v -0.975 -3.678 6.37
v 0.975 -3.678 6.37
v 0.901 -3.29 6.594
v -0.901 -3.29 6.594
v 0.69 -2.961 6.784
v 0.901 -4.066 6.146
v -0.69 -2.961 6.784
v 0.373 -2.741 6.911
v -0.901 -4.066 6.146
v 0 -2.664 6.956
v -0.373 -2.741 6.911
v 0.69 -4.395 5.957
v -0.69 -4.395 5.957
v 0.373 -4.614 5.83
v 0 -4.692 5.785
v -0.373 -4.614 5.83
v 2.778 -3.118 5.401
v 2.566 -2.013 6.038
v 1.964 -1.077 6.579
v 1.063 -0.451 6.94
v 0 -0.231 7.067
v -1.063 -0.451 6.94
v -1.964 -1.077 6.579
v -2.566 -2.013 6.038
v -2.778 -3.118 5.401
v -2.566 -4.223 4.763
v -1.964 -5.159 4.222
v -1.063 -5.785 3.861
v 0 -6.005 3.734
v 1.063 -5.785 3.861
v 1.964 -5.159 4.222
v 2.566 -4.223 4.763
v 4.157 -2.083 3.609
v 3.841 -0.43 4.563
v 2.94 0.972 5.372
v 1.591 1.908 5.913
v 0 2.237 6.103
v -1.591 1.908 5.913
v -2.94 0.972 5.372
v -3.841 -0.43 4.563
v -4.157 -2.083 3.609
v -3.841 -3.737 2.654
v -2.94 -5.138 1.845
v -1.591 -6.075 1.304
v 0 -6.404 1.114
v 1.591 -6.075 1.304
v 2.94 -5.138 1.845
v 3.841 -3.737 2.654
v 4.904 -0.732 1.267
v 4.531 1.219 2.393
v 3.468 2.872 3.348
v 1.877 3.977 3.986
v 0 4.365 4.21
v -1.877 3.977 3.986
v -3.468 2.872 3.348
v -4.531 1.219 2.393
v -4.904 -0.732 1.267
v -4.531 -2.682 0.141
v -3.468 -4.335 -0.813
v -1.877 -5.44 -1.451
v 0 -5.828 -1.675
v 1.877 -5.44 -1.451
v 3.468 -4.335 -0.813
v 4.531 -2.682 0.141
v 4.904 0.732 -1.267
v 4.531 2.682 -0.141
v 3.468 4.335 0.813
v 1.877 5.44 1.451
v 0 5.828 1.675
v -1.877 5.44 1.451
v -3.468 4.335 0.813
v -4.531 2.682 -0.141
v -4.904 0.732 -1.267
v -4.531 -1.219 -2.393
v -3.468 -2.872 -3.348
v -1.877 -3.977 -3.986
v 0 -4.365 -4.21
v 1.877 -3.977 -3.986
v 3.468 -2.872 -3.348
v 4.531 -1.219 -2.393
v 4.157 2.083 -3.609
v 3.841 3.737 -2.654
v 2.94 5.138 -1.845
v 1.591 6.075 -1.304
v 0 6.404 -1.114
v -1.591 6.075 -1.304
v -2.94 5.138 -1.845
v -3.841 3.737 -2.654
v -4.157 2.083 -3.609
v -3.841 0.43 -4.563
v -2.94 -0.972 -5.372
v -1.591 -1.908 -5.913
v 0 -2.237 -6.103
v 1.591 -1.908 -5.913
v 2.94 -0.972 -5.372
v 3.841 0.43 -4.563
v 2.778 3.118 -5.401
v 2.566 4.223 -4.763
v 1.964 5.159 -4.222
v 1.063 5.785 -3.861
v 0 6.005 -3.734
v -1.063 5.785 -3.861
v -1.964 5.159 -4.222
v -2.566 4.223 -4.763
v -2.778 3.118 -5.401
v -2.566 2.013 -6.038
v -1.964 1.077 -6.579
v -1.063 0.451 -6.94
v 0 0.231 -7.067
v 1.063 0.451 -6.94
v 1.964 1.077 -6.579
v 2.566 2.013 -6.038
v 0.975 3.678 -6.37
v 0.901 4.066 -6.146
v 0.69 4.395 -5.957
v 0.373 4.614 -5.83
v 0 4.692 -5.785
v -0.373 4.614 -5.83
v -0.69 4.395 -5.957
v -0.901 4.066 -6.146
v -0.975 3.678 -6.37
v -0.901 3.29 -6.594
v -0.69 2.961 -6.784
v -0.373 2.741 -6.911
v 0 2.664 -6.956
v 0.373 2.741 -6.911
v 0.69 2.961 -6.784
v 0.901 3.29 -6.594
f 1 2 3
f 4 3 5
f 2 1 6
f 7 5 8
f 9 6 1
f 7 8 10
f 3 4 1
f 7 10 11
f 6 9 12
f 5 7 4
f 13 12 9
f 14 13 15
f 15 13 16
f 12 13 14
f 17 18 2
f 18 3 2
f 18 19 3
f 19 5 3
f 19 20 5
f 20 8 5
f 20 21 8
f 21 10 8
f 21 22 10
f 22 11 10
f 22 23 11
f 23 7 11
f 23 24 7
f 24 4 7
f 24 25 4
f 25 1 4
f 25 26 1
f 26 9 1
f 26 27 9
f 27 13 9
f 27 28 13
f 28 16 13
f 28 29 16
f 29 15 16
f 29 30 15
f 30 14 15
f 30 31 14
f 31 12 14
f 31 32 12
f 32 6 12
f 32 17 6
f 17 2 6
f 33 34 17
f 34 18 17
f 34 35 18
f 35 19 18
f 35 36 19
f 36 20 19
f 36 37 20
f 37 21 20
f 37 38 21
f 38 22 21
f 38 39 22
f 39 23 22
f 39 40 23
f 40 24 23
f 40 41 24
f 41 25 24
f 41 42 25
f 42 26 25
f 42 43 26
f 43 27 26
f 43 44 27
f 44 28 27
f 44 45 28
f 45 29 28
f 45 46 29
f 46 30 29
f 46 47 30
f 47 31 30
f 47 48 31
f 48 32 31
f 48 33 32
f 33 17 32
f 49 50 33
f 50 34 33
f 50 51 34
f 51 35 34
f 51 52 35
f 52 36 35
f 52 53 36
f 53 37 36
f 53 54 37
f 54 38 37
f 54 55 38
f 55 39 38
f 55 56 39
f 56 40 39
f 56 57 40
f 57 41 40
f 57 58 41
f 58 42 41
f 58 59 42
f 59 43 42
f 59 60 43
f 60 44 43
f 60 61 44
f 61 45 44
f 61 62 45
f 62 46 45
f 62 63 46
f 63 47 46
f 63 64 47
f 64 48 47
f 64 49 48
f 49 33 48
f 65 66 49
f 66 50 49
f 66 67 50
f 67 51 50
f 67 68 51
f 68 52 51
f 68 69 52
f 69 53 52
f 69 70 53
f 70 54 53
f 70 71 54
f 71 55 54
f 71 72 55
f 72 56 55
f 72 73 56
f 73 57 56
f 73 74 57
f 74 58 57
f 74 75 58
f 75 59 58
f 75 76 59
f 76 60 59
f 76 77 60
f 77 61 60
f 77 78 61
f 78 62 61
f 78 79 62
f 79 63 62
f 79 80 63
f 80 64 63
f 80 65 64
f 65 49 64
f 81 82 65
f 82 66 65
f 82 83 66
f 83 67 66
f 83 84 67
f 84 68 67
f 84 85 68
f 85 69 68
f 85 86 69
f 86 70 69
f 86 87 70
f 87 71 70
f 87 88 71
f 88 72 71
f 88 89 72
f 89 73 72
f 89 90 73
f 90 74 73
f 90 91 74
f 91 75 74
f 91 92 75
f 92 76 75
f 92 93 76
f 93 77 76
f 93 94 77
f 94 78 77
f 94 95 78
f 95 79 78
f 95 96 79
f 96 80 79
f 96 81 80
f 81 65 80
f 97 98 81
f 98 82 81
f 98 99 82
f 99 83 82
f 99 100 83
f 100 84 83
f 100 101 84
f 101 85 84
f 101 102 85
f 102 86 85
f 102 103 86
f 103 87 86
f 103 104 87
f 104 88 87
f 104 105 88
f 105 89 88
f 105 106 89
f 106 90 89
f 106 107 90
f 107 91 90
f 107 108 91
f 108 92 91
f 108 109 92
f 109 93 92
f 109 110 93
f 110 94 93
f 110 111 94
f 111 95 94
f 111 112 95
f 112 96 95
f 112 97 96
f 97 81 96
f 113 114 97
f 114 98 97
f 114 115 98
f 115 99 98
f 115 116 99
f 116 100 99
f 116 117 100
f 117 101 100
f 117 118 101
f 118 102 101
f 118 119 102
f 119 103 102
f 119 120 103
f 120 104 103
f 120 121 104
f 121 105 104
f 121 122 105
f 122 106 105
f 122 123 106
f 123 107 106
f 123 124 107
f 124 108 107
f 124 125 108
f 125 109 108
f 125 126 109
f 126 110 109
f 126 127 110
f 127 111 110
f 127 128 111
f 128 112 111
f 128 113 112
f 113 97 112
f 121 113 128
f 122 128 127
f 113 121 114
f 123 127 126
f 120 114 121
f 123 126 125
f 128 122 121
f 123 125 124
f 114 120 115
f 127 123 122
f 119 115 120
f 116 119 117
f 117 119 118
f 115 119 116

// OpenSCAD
rotate([30,0,0]){
    scale([1,1.2,1.5]){
        sphere(r=5);
    }
}
